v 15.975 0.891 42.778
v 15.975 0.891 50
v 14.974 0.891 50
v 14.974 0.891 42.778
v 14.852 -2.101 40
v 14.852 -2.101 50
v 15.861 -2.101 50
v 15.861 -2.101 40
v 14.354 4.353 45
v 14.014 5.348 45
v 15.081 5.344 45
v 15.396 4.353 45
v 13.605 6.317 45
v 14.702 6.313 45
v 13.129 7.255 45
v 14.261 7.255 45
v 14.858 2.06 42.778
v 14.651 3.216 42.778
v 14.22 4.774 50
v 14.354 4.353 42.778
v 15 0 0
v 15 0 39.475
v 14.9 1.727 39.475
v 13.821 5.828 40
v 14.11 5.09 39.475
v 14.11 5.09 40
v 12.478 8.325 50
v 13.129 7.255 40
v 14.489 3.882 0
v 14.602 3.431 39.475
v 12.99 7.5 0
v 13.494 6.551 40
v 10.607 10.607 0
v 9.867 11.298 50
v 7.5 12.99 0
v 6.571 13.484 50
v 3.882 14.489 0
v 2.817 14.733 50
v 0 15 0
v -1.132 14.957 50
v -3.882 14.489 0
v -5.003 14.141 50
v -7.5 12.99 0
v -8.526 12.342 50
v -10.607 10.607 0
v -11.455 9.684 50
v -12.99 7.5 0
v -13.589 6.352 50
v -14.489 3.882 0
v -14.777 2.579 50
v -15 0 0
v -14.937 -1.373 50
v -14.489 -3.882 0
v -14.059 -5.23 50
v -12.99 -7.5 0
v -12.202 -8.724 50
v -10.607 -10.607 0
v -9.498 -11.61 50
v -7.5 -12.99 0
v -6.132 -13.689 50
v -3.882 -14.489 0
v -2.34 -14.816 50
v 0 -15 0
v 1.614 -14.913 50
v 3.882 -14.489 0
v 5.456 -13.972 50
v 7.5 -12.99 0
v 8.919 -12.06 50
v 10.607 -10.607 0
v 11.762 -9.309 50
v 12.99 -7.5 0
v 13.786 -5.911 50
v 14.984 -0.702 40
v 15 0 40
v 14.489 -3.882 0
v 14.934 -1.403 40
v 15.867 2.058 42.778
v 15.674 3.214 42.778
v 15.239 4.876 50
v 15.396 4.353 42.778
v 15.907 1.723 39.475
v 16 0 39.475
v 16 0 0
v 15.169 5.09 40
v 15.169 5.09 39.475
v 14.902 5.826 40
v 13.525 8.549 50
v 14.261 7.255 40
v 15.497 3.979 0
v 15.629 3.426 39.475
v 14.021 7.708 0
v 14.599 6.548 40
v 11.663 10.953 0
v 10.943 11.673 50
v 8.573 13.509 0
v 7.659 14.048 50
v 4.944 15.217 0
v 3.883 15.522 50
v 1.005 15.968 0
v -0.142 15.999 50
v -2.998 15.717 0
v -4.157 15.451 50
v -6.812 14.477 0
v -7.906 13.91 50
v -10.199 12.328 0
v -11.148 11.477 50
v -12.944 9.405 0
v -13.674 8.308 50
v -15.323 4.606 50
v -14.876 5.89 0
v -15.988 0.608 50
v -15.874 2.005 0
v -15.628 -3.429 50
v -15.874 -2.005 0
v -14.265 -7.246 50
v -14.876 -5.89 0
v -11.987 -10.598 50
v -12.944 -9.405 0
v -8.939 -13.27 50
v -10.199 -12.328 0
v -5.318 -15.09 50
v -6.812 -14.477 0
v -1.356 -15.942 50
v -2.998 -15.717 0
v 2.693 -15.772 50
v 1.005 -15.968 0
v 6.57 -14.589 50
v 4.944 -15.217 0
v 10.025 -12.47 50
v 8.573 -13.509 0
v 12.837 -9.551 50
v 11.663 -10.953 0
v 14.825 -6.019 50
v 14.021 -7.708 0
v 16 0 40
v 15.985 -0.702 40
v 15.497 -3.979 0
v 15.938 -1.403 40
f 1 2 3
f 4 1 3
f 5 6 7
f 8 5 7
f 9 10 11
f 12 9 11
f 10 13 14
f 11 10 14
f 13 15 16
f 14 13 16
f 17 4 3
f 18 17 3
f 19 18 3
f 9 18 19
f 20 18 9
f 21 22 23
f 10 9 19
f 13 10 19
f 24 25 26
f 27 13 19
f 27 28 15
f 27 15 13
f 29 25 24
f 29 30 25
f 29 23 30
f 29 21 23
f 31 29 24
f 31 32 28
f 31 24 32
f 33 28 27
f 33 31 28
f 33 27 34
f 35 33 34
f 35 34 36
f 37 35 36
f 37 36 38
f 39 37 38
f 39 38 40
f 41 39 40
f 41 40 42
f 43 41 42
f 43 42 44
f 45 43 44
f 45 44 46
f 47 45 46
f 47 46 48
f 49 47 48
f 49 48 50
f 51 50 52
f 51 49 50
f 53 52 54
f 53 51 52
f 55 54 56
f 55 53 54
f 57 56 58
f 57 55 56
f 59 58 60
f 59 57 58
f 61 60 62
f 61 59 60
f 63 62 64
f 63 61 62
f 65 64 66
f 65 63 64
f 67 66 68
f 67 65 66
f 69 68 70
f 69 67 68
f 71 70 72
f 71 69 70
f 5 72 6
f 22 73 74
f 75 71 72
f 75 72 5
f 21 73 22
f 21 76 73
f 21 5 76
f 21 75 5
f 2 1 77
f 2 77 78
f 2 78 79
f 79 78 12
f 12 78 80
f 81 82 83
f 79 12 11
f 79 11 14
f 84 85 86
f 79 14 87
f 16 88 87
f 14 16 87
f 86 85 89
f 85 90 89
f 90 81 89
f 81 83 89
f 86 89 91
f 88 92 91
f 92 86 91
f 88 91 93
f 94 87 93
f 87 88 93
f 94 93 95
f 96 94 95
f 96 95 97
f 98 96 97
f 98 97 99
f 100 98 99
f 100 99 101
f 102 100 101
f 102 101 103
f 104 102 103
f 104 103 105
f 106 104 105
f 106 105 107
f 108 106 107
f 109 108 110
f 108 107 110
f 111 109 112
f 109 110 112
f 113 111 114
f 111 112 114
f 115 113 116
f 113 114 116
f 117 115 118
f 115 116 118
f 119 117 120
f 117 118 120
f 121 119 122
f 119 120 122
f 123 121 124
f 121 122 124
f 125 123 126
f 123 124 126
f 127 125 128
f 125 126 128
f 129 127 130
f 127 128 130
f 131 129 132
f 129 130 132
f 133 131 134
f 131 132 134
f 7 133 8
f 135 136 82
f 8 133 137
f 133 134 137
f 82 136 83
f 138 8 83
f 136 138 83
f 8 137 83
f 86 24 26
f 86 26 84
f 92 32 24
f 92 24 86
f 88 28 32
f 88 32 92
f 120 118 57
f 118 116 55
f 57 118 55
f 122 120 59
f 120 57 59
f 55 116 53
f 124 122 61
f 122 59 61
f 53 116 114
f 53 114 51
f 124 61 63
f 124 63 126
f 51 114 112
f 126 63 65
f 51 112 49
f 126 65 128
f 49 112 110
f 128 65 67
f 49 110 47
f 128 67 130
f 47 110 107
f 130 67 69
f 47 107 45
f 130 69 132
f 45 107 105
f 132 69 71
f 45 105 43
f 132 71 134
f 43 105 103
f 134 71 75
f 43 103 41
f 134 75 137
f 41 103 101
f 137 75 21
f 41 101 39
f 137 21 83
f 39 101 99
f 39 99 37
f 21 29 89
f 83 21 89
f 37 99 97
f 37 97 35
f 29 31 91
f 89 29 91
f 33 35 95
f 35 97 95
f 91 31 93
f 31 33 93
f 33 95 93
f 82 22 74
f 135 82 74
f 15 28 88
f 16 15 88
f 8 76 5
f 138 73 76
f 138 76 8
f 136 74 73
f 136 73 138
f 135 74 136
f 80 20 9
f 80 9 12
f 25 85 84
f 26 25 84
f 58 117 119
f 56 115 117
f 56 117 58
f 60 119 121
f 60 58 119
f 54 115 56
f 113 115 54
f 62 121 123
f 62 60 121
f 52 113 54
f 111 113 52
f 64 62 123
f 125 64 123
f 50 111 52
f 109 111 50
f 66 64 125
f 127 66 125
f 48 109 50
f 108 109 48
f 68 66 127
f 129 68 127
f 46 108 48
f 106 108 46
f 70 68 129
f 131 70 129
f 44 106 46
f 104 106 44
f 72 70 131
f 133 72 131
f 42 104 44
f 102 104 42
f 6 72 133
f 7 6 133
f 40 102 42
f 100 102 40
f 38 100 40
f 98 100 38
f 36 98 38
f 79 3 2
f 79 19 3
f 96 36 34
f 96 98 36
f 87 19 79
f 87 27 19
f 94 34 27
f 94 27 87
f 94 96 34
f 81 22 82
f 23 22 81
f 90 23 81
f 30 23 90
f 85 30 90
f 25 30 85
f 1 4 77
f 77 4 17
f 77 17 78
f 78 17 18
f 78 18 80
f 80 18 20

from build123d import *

# Parameters (mm, degrees)
F0_R     = 16
F0_R_2   = 15
F1_DEPTH = 50
F3_DEPTH = 10
F5_W     = 4.5602535829
F5_H     = 2.9019792564
F6_DEPTH = 5
F7_W     = 5.0895041786
F7_H     = 3.3034160733
F8_DEPTH = 49.4


with BuildPart() as f1:
    # F0 (on Top) → F1 (new body)
    with BuildSketch(Plane.XY):
        Circle(F0_R)
        Circle(F0_R_2, mode=Mode.SUBTRACT)
    extrude(amount=F1_DEPTH)

    # F2 (on face) → F3 (cut)
    with BuildSketch(Plane.XY.offset(50)):
        with BuildLine():
            Line((15.9751944562, 0.8905964787), (14.9735379224, 0.8905964787))
            ThreePointArc((14.9735379224, 0.8905964787), (14.9933830211, 0.4454947613), (15, 0))
            ThreePointArc((15, 0), (14.9629845517, -1.0531349891), (14.8521208926, -2.1010723431))
            Line((14.8521208926, -2.1010723431), (15.8614468132, -2.1010723431))
            ThreePointArc((15.8614468132, -2.1010723431), (15.9653241278, -1.0528178827), (16, 0))
            ThreePointArc((16, 0), (15.9937974118, 0.4454709314), (15.9751944562, 0.8905964787))
        make_face()
    extrude(amount=-F3_DEPTH, mode=Mode.SUBTRACT)

    # F5 (on offset) → F6 (cut)
    with BuildSketch(Plane.XY.offset(40)):
        with Locations((14.4062549807, 5.8039587457)):
            Rectangle(F5_W, F5_H)
    extrude(amount=F6_DEPTH, mode=Mode.SUBTRACT)

    # F7 (on Right) → F8 (cut)
    with BuildSketch(Plane.YZ):
        with Locations((2.5447520893, 41.1266498268)):
            Rectangle(F7_W, F7_H)
    extrude(amount=F8_DEPTH, mode=Mode.SUBTRACT)


solid = f1.part
